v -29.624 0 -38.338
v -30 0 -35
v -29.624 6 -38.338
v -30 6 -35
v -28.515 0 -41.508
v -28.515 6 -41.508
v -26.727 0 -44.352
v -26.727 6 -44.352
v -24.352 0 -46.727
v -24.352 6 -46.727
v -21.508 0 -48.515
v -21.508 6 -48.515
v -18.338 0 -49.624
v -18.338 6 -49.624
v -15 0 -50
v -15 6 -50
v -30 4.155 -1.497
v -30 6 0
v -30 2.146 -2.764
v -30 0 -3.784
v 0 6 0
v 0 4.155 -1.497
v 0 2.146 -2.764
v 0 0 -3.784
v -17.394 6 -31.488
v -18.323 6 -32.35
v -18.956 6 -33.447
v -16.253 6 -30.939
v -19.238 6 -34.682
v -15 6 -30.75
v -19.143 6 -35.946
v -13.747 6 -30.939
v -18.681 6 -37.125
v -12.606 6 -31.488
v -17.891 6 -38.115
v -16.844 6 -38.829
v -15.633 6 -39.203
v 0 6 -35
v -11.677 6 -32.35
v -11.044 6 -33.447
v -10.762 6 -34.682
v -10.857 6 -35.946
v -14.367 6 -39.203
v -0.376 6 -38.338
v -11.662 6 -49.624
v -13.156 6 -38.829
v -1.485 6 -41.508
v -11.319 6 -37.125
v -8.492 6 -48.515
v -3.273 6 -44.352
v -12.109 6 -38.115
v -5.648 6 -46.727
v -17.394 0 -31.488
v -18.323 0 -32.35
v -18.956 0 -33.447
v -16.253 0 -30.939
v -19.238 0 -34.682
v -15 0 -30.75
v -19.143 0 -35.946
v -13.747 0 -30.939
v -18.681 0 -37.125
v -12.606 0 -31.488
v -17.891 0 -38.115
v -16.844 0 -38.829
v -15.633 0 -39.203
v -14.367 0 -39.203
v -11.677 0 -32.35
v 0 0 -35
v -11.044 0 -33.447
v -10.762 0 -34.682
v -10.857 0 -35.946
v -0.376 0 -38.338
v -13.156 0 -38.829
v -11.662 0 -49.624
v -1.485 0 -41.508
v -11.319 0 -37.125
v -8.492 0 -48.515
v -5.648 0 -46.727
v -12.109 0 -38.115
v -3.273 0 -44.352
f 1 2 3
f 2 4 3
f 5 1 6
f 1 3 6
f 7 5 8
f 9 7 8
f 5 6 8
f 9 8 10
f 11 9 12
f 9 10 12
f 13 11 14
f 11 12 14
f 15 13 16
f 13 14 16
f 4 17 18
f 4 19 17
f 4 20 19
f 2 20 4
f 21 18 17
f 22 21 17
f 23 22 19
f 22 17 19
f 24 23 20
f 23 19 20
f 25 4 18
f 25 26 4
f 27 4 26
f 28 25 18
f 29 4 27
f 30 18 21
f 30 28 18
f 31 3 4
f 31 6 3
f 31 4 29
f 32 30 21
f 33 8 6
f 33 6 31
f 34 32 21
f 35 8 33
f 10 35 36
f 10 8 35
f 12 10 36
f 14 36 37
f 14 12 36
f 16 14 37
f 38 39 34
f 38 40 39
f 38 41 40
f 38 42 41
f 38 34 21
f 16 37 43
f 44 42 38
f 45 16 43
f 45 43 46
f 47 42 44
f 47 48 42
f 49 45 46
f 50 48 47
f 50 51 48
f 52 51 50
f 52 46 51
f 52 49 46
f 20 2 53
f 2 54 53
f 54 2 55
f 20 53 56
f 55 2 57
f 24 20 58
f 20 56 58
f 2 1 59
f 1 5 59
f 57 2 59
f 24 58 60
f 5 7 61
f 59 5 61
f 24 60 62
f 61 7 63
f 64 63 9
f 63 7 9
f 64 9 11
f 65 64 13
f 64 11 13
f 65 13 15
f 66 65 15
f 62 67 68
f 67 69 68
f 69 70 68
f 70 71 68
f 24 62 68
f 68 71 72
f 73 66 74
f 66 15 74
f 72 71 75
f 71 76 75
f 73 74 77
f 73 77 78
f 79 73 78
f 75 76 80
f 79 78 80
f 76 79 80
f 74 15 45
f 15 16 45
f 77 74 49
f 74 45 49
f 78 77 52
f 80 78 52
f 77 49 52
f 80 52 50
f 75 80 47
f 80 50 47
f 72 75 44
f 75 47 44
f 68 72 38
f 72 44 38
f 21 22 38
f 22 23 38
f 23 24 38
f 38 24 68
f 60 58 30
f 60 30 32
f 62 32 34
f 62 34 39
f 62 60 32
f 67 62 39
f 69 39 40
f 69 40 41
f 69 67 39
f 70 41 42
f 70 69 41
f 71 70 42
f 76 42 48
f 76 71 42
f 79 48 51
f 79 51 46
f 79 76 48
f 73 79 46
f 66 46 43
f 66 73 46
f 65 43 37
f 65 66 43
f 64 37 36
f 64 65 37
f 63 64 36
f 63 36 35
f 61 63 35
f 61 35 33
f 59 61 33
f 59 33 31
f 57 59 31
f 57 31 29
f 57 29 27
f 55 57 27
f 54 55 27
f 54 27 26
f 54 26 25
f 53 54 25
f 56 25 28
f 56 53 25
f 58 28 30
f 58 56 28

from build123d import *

# Parameters (mm, degrees)
SKETCH1_W           = 30
SKETCH1_H           = 50
SKETCH1_R           = 4.25
BOSS_EXTRUDE1_DEPTH = 6
FILLET1_R           = 15
SKETCH2_R           = 20
CUT_EXTRUDE1_DEPTH  = 59.617403559


with BuildPart() as part:
    # Sketch1 → Boss-Extrude1 (new body)
    with BuildSketch(Plane(origin=(0, 0, 0), x_dir=(1, 0, 0), z_dir=(0, 1, 0))):
        with Locations((-15, 25)):
            Rectangle(SKETCH1_W, SKETCH1_H)
        with Locations(Location((-15, 35, 0), (0, 0, 270))):
            Circle(SKETCH1_R, mode=Mode.SUBTRACT)
    extrude(amount=BOSS_EXTRUDE1_DEPTH)

    # Fillet1
    fillet1_edges = [part.edges().sort_by_distance(p)[0] for p in [
        (-30, 3, -50),
        (0, 3, -50),
    ]]
    fillet(fillet1_edges, radius=FILLET1_R - 0.0001)  # a hair under: the kernel refuses the full size

    # Sketch2 → Cut-Extrude1 (cut, through all)
    with BuildSketch(Plane.ZY.offset(30)):
        with Locations((14.756354563, -7.5)):
            Circle(SKETCH2_R)
    extrude(amount=-CUT_EXTRUDE1_DEPTH, mode=Mode.SUBTRACT)


solid = part.part
